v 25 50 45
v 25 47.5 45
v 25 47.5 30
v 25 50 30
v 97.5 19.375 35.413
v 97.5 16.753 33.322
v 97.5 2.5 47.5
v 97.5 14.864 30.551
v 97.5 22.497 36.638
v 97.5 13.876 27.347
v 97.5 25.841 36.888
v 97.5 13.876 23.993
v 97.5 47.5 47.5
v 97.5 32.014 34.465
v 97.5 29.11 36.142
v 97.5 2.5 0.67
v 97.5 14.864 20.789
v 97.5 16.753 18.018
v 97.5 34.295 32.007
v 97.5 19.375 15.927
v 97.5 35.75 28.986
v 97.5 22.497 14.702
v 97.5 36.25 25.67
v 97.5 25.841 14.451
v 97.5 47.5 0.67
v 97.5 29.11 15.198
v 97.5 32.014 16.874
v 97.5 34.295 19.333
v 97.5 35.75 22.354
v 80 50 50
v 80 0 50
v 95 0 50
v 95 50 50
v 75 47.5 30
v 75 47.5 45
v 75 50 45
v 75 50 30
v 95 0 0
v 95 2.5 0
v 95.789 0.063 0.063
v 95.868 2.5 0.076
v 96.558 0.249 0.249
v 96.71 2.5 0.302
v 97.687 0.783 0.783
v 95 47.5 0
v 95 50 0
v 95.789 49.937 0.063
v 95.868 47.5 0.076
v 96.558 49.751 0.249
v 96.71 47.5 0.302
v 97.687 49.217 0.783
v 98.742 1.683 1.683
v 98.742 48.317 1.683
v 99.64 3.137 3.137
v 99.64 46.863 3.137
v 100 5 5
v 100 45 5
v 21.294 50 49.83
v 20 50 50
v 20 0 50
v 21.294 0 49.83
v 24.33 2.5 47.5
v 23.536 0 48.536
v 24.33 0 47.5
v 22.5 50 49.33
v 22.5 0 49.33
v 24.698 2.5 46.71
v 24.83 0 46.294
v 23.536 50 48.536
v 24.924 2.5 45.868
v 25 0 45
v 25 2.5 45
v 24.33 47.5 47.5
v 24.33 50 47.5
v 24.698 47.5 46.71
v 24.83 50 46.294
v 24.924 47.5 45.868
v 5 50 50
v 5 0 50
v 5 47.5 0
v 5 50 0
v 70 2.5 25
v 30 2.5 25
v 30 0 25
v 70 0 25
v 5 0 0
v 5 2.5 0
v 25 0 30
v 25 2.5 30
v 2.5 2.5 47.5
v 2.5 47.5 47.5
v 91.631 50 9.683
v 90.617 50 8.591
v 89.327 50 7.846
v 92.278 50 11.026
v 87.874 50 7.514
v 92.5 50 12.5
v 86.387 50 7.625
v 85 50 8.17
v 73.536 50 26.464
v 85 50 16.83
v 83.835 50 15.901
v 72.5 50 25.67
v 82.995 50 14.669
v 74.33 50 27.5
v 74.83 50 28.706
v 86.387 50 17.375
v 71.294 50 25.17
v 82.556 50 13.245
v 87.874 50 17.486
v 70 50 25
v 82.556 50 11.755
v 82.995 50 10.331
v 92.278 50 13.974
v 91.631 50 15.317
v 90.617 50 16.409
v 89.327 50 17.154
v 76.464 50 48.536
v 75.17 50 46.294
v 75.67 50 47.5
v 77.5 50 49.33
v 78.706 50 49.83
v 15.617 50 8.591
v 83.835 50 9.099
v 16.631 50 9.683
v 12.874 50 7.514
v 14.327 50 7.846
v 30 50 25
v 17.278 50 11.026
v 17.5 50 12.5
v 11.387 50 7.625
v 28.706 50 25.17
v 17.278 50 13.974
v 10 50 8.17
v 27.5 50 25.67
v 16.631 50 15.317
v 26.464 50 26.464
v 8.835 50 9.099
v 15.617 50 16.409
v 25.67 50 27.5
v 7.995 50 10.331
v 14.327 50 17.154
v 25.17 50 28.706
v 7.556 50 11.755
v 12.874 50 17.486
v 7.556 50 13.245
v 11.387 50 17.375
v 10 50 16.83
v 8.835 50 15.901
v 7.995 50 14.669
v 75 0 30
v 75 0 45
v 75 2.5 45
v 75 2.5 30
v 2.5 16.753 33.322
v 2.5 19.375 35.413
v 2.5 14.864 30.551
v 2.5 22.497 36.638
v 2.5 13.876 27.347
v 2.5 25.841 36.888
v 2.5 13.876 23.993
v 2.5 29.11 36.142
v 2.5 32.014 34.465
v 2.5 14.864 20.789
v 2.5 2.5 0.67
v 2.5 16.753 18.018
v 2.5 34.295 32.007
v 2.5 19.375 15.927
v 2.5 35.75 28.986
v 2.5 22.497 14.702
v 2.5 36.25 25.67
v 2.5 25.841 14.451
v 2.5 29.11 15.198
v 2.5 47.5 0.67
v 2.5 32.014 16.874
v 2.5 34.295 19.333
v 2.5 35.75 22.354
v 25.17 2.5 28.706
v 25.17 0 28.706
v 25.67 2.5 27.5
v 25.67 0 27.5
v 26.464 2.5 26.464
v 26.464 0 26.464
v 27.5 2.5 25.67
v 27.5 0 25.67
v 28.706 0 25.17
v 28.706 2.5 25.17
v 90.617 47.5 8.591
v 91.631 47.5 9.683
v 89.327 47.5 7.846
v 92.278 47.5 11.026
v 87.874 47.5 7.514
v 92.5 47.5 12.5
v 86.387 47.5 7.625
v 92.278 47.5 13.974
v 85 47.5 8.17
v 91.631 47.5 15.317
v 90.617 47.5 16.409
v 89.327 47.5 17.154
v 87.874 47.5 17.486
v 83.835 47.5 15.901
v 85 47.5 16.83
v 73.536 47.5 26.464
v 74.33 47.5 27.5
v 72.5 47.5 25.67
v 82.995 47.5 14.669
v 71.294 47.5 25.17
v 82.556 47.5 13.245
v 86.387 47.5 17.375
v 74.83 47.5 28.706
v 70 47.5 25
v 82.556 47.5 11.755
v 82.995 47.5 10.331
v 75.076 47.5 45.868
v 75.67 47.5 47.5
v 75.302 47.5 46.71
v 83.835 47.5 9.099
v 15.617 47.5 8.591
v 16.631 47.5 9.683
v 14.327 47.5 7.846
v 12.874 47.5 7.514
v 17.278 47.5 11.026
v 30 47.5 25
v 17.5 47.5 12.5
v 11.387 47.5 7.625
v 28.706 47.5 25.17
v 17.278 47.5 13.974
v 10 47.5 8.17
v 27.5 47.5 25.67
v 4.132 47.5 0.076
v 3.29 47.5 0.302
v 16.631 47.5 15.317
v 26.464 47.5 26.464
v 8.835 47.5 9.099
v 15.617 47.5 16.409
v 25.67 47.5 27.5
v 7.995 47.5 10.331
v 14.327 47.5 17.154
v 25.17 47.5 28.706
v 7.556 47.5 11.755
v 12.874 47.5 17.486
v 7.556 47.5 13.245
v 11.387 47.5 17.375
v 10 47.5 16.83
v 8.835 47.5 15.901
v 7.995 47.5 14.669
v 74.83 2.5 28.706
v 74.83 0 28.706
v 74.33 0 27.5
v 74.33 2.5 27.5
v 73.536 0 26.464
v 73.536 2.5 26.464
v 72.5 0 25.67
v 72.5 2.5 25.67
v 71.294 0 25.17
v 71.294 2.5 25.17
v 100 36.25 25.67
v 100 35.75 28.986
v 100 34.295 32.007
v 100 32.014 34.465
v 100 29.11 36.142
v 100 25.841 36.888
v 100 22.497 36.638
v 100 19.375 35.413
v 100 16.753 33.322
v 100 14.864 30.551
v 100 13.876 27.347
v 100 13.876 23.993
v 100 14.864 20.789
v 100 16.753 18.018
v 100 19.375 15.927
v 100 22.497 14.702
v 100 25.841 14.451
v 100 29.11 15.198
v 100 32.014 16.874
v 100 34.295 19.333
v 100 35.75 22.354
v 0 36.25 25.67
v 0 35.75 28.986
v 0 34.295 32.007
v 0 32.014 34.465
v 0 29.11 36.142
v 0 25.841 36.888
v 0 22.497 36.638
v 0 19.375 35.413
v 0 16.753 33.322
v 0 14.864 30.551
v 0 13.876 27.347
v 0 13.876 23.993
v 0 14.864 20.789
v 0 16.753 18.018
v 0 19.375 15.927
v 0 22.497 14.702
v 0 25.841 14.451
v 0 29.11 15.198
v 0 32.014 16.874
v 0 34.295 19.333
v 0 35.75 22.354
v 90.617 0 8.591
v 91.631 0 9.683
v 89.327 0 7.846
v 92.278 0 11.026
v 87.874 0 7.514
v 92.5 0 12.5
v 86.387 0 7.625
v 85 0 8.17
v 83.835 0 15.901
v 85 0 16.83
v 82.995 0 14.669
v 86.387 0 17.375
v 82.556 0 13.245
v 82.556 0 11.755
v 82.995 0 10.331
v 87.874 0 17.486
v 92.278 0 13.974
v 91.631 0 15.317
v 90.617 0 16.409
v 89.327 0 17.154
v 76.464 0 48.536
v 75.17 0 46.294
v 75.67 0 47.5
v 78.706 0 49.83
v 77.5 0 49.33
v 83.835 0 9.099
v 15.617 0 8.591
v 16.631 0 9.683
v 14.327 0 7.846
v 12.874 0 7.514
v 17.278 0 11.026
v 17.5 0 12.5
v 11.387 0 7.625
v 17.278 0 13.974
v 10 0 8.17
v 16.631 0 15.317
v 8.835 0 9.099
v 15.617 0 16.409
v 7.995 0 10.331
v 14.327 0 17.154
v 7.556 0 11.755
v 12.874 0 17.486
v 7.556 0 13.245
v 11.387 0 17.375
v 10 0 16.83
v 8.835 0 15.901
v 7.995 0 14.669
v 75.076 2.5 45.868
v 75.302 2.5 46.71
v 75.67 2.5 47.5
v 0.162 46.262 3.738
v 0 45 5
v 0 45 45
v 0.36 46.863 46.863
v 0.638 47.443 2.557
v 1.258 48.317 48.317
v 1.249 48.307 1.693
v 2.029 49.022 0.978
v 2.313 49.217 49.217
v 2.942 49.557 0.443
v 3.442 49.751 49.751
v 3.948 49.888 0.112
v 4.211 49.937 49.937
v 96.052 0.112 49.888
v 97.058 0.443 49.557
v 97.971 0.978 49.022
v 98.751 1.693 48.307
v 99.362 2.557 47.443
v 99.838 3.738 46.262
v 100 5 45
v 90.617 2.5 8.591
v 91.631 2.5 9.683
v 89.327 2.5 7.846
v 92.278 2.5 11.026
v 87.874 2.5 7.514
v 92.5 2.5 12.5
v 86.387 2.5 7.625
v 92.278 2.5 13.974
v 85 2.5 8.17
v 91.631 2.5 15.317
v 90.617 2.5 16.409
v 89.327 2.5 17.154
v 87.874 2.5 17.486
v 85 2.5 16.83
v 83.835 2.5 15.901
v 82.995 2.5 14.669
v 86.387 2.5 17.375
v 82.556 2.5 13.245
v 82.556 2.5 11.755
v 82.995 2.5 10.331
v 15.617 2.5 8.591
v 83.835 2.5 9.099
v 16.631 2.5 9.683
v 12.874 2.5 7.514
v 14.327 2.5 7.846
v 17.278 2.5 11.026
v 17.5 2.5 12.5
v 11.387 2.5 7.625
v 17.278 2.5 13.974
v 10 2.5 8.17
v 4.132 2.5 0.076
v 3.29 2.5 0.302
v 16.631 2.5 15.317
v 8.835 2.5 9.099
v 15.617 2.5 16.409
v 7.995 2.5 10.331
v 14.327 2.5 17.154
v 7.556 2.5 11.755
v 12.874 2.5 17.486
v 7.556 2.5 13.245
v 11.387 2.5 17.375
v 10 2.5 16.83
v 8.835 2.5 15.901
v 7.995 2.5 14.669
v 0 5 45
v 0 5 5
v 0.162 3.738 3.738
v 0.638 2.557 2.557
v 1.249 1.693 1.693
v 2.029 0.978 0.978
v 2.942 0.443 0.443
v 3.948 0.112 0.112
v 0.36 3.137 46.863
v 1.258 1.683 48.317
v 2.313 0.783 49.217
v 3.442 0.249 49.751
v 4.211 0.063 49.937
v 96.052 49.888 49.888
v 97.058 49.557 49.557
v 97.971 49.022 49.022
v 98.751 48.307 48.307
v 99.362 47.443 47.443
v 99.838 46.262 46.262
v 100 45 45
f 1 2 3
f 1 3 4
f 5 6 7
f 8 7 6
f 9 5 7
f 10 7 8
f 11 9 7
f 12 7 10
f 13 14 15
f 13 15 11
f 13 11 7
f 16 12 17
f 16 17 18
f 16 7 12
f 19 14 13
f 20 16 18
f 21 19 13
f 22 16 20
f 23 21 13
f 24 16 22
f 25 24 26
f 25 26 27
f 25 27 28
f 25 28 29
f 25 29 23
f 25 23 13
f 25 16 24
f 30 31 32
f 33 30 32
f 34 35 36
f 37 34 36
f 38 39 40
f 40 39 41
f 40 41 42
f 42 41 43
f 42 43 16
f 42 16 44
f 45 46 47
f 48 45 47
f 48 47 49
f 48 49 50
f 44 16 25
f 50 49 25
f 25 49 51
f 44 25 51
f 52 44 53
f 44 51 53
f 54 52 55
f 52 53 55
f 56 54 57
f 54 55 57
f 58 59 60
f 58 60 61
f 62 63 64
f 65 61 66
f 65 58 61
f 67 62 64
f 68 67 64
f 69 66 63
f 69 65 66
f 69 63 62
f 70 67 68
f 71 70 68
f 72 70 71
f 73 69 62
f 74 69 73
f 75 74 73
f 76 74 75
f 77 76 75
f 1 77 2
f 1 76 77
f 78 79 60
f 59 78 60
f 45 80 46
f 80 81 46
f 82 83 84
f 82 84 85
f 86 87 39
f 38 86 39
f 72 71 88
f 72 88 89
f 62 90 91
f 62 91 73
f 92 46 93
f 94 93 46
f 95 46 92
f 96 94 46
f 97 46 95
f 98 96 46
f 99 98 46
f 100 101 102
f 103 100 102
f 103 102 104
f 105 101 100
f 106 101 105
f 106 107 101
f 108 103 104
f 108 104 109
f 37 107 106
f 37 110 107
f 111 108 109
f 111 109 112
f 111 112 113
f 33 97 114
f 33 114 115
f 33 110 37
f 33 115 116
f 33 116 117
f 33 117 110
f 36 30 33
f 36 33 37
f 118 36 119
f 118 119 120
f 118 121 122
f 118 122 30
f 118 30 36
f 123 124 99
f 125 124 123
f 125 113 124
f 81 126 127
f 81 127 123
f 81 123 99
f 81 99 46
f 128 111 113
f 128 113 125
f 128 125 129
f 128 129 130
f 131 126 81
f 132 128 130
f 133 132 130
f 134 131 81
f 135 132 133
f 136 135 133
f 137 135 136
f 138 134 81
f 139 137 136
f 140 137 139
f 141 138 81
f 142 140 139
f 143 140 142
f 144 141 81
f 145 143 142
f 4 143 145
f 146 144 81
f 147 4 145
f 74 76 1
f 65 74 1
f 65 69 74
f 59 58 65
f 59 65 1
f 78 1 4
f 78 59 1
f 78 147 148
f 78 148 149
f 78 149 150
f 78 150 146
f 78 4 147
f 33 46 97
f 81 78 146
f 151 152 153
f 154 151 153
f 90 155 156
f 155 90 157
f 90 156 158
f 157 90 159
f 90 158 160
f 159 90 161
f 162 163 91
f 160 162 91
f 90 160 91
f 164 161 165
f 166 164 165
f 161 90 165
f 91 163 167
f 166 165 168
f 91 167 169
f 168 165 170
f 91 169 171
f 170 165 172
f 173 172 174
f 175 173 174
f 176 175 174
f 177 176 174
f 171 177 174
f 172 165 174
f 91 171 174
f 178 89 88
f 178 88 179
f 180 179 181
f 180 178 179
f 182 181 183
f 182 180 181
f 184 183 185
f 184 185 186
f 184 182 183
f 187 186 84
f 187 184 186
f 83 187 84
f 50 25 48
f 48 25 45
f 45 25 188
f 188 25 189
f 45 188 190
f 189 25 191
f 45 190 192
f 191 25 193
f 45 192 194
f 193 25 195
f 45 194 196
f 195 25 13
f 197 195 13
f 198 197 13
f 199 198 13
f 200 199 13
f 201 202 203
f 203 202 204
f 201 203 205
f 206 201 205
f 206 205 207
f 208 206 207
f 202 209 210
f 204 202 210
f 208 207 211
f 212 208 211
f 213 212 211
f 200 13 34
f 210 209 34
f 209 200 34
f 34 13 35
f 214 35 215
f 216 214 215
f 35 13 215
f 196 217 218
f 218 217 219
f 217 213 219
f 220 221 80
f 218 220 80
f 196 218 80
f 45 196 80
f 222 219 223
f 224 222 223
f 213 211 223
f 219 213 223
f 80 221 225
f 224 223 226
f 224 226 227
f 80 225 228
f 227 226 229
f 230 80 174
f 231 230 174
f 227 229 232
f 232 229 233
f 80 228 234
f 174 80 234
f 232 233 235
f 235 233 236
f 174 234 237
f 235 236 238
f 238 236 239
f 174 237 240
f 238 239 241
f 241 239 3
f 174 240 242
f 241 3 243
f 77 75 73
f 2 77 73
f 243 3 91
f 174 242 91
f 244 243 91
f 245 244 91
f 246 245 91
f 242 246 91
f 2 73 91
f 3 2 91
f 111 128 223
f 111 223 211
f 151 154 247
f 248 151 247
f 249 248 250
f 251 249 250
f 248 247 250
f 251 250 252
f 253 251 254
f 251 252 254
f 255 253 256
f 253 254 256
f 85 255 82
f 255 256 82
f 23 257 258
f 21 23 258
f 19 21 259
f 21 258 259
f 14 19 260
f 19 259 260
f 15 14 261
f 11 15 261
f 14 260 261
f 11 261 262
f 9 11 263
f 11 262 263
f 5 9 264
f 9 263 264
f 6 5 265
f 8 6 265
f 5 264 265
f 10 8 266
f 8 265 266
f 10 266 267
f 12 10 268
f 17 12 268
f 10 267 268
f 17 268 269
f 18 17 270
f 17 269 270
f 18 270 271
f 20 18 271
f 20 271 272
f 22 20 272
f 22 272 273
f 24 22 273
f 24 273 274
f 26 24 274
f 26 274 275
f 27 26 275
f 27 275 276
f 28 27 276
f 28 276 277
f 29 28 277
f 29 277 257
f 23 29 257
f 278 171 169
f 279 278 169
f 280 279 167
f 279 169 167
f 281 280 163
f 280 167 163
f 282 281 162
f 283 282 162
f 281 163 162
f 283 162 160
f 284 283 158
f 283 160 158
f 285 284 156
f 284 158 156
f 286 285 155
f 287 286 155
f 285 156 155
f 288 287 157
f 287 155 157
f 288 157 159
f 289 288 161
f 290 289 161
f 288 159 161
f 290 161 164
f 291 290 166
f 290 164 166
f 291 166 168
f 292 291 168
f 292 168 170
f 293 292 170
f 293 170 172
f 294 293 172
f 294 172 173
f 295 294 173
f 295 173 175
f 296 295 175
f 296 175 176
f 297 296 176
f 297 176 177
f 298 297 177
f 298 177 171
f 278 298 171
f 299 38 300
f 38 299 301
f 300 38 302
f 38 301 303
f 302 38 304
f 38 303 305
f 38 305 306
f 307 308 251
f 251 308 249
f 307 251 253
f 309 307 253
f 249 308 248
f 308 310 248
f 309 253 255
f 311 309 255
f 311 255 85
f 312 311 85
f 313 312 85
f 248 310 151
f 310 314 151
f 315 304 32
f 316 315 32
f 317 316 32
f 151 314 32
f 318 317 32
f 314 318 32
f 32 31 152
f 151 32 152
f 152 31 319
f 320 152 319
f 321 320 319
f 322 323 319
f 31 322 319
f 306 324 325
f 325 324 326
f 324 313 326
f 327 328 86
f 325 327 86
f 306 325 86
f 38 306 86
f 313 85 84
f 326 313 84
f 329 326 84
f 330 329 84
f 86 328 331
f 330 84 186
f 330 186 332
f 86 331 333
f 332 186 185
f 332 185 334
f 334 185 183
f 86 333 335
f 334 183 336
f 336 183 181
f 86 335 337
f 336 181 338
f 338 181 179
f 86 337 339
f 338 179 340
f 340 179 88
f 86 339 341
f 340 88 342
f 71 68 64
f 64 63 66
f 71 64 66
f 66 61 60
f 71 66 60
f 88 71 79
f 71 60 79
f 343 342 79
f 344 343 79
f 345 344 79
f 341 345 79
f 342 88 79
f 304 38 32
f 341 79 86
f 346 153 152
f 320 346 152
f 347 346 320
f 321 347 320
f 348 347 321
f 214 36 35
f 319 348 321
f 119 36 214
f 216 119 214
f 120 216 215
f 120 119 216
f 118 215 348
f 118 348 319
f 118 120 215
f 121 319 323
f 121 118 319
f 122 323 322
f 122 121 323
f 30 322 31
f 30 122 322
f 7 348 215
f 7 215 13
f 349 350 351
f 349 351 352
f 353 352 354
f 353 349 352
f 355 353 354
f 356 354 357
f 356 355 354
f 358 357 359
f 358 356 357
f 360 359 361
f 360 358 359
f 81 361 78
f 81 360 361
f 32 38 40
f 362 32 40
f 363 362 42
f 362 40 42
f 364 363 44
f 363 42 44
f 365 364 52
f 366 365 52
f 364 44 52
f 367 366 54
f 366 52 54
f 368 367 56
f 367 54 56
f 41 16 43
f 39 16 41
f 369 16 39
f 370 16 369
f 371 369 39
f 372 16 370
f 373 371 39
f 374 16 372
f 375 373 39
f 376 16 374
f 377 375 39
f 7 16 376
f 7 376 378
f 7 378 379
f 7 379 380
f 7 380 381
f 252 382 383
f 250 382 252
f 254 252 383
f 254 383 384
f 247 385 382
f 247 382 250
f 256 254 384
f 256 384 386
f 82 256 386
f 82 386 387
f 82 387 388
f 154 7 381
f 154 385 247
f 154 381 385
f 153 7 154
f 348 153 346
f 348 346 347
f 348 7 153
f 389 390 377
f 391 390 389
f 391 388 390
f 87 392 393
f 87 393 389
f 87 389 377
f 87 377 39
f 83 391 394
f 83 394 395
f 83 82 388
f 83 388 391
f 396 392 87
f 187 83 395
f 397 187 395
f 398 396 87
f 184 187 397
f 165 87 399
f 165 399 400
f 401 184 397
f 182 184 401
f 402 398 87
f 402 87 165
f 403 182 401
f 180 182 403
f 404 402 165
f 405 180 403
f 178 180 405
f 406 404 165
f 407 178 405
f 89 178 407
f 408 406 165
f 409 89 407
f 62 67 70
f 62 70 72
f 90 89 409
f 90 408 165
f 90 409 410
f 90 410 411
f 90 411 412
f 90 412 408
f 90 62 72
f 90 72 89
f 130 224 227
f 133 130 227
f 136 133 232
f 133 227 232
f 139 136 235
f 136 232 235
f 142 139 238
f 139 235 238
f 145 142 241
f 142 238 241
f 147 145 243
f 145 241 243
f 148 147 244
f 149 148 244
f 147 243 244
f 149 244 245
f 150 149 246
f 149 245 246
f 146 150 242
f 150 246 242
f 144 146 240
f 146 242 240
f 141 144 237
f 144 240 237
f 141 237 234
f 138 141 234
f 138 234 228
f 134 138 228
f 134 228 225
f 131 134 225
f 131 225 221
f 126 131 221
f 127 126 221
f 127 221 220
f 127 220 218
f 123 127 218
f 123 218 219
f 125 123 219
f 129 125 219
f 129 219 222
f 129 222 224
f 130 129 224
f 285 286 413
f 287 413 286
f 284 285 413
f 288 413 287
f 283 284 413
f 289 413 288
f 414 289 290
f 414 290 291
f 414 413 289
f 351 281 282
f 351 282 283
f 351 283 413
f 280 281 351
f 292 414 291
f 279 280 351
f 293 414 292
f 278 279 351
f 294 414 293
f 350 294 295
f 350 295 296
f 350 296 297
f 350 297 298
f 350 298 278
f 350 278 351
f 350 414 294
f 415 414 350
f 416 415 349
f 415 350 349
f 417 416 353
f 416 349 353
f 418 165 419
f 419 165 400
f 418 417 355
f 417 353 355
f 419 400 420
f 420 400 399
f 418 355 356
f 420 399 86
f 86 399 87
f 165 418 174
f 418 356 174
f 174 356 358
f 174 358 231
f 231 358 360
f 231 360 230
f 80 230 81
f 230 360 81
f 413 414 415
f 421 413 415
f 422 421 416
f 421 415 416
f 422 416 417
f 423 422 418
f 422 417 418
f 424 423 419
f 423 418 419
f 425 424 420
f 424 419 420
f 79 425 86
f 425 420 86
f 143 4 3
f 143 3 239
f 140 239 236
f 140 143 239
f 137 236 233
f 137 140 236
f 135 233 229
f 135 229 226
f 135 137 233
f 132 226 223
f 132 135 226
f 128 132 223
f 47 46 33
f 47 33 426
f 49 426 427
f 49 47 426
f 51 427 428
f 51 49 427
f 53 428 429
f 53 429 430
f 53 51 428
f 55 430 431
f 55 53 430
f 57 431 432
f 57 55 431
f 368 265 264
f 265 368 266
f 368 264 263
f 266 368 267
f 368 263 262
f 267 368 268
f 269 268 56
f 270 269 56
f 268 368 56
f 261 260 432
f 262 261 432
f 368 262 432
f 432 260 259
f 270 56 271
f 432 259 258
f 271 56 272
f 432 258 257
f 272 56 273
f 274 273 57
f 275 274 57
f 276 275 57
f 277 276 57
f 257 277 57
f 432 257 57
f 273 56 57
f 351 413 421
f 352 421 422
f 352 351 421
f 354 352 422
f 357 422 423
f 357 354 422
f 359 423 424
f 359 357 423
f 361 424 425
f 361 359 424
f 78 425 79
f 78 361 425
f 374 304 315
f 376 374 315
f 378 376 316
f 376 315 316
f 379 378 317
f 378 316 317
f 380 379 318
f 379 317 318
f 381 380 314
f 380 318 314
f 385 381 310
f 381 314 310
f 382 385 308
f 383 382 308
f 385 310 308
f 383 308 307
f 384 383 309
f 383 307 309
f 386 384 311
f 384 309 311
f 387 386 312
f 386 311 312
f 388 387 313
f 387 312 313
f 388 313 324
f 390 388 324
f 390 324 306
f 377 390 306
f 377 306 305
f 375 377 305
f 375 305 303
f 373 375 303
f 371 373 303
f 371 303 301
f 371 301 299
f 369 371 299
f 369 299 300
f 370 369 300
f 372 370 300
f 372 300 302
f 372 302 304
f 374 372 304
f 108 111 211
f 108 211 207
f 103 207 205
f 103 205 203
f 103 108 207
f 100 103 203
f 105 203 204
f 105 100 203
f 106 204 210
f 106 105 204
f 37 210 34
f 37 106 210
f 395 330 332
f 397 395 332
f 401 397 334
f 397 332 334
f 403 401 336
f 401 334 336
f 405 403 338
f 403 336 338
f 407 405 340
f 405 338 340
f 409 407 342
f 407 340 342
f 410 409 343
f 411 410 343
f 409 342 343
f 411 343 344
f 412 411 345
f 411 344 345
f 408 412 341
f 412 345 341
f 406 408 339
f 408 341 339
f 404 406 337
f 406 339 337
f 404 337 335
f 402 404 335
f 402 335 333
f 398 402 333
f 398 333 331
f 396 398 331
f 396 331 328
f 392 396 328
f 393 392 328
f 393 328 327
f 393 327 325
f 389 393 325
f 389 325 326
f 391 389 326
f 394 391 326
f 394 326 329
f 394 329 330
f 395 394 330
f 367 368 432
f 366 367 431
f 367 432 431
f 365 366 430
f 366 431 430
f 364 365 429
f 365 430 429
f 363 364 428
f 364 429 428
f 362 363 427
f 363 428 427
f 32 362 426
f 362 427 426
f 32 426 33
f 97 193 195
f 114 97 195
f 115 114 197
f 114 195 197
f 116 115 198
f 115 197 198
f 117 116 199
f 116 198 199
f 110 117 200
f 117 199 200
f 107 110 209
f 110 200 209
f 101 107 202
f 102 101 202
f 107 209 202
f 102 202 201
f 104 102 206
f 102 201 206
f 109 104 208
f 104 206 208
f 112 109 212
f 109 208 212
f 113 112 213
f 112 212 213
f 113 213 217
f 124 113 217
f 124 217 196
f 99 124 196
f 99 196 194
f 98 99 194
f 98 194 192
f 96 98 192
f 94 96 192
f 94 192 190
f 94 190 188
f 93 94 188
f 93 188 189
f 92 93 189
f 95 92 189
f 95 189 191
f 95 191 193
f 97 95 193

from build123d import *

# Parameters (mm, degrees)
F0_W        = 100
F0_H        = 50
F1_DEPTH    = 50
F2_T        = -2.5
F3_W        = 50
F3_H        = 70.2898527046
F4_DEPTH    = 25
F5_R        = 5
F6_DEPTH    = 50
F7_T1_DEPTH = 75
F7_T3_DEPTH = 75
F8_T1_DEPTH = 2.5
F8_T3_DEPTH = 2.5
F8_T5_DEPTH = 75
F9_T1_DEPTH = 75
F9_T3_DEPTH = 75
F10_R       = 11.25
F11_DEPTH   = 100


# Not quite as in the source:
# - a fillet or chamfer that OpenCascade refuses, or shapes differently, is made with other operations: its cross-section is extruded or revolved along the edge and cut away or added


with BuildPart() as f1:
    # F0 (on Top) → F1 (new body)
    with BuildSketch(Plane.XY):
        with Locations((50, 25)):
            Rectangle(F0_W, F0_H)
    extrude(amount=F1_DEPTH)

    # F2
    f2_openings = [f1.faces().sort_by_distance(p)[0] for p in [
        (50, 25, 0),
    ]]
    offset(amount=F2_T, openings=f2_openings)

    # F3 (on face) → F4 (cut)
    with BuildSketch(Plane.XY.offset(50)):
        with Locations((50, 24.9999999069)):
            Rectangle(F3_W, F3_H)
    extrude(amount=-F4_DEPTH, mode=Mode.SUBTRACT)

    # F5 (on face) → F6 (cut)
    with BuildSketch(Plane.XZ):
        with Locations((12.5, 12.5)):
            Circle(F5_R)
        with Locations((87.5, 12.5)):
            Circle(F5_R)
    extrude(amount=-F6_DEPTH, mode=Mode.SUBTRACT)

    # F7: fillet of radius 5 on 4 edges, made by hand

    # F7_s2 → F7_t1 (cut)
    with BuildSketch(Plane.XZ.offset(-62.5)):
        with BuildLine():
            ThreePointArc((0, 45), (1.4644660941, 48.5355339059), (5, 50))
            Line((5, 50), (0, 50))
            Line((0, 50), (0, 45))
        make_face()
        with BuildLine():
            ThreePointArc((0, 5), (1.4644660941, 1.4644660941), (5, 0))
            Line((5, 0), (0, 0))
            Line((0, 0), (0, 5))
        make_face()
    extrude(amount=F7_T1_DEPTH, mode=Mode.SUBTRACT)

    # F7_s4 → F7_t3 (cut)
    with BuildSketch(Plane.XY.offset(-12.5)):
        with BuildLine():
            ThreePointArc((0, 5), (1.4644660941, 1.4644660941), (5, 0))
            Line((5, 0), (0, 0))
            Line((0, 0), (0, 5))
        make_face()
        with BuildLine():
            ThreePointArc((0, 45), (1.4644660941, 48.5355339059), (5, 50))
            Line((5, 50), (0, 50))
            Line((0, 50), (0, 45))
        make_face()
    extrude(amount=F7_T3_DEPTH, mode=Mode.SUBTRACT)

    # F8: fillet of radius 5 on 6 edges, made by hand

    # F8_s2 → F8_t1 (join)
    with BuildSketch(Plane.XZ.offset(-2.5)):
        with BuildLine():
            ThreePointArc((25, 30), (26.4644660941, 26.4644660941), (30, 25))
            Line((30, 25), (25, 25))
            Line((25, 25), (25, 30))
        make_face()
        with BuildLine():
            ThreePointArc((75, 30), (73.5355339059, 26.4644660941), (70, 25))
            Line((70, 25), (75, 25))
            Line((75, 25), (75, 30))
        make_face()
    extrude(amount=F8_T1_DEPTH)

    # F8_s4 → F8_t3 (join)
    with BuildSketch(Plane.XZ.offset(-50)):
        with BuildLine():
            ThreePointArc((25, 30), (26.4644660941, 26.4644660941), (30, 25))
            Line((30, 25), (25, 25))
            Line((25, 25), (25, 30))
        make_face()
        with BuildLine():
            ThreePointArc((70, 25), (73.5355339059, 26.4644660941), (75, 30))
            Line((75, 30), (75, 25))
            Line((75, 25), (70, 25))
        make_face()
    extrude(amount=F8_T3_DEPTH)

    # F8_s6 → F8_t5 (cut)
    with BuildSketch(Plane.XZ.offset(-62.5)):
        with BuildLine():
            ThreePointArc((20, 50), (23.5355339059, 48.5355339059), (25, 45))
            Line((25, 45), (25, 50))
            Line((25, 50), (20, 50))
        make_face()
        with BuildLine():
            ThreePointArc((75, 45), (76.4644660941, 48.5355339059), (80, 50))
            Line((80, 50), (75, 50))
            Line((75, 50), (75, 45))
        make_face()
    extrude(amount=F8_T5_DEPTH, mode=Mode.SUBTRACT)

    # F9: fillet of radius 5 on 4 edges, made by hand

    # F9_s2 → F9_t1 (cut)
    with BuildSketch(Plane.XZ.offset(-62.5)):
        with BuildLine():
            ThreePointArc((100, 45), (98.5355339059, 48.5355339059), (95, 50))
            Line((95, 50), (100, 50))
            Line((100, 50), (100, 45))
        make_face()
        with BuildLine():
            ThreePointArc((95, 0), (98.5355339059, 1.4644660941), (100, 5))
            Line((100, 5), (100, 0))
            Line((100, 0), (95, 0))
        make_face()
    extrude(amount=F9_T1_DEPTH, mode=Mode.SUBTRACT)

    # F9_s4 → F9_t3 (cut)
    with BuildSketch(Plane.XY.offset(-12.5)):
        with BuildLine():
            ThreePointArc((95, 0), (98.5355339059, 1.4644660941), (100, 5))
            Line((100, 5), (100, 0))
            Line((100, 0), (95, 0))
        make_face()
        with BuildLine():
            ThreePointArc((95, 50), (98.5355339059, 48.5355339059), (100, 45))
            Line((100, 45), (100, 50))
            Line((100, 50), (95, 50))
        make_face()
    extrude(amount=F9_T3_DEPTH, mode=Mode.SUBTRACT)

    # F10 (on face) → F11 (cut)
    with BuildSketch(Plane.YZ.offset(100)):
        with Locations((25, 25.6698729811)):
            Circle(F10_R)
    extrude(amount=-F11_DEPTH, mode=Mode.SUBTRACT)


solid = f1.part
